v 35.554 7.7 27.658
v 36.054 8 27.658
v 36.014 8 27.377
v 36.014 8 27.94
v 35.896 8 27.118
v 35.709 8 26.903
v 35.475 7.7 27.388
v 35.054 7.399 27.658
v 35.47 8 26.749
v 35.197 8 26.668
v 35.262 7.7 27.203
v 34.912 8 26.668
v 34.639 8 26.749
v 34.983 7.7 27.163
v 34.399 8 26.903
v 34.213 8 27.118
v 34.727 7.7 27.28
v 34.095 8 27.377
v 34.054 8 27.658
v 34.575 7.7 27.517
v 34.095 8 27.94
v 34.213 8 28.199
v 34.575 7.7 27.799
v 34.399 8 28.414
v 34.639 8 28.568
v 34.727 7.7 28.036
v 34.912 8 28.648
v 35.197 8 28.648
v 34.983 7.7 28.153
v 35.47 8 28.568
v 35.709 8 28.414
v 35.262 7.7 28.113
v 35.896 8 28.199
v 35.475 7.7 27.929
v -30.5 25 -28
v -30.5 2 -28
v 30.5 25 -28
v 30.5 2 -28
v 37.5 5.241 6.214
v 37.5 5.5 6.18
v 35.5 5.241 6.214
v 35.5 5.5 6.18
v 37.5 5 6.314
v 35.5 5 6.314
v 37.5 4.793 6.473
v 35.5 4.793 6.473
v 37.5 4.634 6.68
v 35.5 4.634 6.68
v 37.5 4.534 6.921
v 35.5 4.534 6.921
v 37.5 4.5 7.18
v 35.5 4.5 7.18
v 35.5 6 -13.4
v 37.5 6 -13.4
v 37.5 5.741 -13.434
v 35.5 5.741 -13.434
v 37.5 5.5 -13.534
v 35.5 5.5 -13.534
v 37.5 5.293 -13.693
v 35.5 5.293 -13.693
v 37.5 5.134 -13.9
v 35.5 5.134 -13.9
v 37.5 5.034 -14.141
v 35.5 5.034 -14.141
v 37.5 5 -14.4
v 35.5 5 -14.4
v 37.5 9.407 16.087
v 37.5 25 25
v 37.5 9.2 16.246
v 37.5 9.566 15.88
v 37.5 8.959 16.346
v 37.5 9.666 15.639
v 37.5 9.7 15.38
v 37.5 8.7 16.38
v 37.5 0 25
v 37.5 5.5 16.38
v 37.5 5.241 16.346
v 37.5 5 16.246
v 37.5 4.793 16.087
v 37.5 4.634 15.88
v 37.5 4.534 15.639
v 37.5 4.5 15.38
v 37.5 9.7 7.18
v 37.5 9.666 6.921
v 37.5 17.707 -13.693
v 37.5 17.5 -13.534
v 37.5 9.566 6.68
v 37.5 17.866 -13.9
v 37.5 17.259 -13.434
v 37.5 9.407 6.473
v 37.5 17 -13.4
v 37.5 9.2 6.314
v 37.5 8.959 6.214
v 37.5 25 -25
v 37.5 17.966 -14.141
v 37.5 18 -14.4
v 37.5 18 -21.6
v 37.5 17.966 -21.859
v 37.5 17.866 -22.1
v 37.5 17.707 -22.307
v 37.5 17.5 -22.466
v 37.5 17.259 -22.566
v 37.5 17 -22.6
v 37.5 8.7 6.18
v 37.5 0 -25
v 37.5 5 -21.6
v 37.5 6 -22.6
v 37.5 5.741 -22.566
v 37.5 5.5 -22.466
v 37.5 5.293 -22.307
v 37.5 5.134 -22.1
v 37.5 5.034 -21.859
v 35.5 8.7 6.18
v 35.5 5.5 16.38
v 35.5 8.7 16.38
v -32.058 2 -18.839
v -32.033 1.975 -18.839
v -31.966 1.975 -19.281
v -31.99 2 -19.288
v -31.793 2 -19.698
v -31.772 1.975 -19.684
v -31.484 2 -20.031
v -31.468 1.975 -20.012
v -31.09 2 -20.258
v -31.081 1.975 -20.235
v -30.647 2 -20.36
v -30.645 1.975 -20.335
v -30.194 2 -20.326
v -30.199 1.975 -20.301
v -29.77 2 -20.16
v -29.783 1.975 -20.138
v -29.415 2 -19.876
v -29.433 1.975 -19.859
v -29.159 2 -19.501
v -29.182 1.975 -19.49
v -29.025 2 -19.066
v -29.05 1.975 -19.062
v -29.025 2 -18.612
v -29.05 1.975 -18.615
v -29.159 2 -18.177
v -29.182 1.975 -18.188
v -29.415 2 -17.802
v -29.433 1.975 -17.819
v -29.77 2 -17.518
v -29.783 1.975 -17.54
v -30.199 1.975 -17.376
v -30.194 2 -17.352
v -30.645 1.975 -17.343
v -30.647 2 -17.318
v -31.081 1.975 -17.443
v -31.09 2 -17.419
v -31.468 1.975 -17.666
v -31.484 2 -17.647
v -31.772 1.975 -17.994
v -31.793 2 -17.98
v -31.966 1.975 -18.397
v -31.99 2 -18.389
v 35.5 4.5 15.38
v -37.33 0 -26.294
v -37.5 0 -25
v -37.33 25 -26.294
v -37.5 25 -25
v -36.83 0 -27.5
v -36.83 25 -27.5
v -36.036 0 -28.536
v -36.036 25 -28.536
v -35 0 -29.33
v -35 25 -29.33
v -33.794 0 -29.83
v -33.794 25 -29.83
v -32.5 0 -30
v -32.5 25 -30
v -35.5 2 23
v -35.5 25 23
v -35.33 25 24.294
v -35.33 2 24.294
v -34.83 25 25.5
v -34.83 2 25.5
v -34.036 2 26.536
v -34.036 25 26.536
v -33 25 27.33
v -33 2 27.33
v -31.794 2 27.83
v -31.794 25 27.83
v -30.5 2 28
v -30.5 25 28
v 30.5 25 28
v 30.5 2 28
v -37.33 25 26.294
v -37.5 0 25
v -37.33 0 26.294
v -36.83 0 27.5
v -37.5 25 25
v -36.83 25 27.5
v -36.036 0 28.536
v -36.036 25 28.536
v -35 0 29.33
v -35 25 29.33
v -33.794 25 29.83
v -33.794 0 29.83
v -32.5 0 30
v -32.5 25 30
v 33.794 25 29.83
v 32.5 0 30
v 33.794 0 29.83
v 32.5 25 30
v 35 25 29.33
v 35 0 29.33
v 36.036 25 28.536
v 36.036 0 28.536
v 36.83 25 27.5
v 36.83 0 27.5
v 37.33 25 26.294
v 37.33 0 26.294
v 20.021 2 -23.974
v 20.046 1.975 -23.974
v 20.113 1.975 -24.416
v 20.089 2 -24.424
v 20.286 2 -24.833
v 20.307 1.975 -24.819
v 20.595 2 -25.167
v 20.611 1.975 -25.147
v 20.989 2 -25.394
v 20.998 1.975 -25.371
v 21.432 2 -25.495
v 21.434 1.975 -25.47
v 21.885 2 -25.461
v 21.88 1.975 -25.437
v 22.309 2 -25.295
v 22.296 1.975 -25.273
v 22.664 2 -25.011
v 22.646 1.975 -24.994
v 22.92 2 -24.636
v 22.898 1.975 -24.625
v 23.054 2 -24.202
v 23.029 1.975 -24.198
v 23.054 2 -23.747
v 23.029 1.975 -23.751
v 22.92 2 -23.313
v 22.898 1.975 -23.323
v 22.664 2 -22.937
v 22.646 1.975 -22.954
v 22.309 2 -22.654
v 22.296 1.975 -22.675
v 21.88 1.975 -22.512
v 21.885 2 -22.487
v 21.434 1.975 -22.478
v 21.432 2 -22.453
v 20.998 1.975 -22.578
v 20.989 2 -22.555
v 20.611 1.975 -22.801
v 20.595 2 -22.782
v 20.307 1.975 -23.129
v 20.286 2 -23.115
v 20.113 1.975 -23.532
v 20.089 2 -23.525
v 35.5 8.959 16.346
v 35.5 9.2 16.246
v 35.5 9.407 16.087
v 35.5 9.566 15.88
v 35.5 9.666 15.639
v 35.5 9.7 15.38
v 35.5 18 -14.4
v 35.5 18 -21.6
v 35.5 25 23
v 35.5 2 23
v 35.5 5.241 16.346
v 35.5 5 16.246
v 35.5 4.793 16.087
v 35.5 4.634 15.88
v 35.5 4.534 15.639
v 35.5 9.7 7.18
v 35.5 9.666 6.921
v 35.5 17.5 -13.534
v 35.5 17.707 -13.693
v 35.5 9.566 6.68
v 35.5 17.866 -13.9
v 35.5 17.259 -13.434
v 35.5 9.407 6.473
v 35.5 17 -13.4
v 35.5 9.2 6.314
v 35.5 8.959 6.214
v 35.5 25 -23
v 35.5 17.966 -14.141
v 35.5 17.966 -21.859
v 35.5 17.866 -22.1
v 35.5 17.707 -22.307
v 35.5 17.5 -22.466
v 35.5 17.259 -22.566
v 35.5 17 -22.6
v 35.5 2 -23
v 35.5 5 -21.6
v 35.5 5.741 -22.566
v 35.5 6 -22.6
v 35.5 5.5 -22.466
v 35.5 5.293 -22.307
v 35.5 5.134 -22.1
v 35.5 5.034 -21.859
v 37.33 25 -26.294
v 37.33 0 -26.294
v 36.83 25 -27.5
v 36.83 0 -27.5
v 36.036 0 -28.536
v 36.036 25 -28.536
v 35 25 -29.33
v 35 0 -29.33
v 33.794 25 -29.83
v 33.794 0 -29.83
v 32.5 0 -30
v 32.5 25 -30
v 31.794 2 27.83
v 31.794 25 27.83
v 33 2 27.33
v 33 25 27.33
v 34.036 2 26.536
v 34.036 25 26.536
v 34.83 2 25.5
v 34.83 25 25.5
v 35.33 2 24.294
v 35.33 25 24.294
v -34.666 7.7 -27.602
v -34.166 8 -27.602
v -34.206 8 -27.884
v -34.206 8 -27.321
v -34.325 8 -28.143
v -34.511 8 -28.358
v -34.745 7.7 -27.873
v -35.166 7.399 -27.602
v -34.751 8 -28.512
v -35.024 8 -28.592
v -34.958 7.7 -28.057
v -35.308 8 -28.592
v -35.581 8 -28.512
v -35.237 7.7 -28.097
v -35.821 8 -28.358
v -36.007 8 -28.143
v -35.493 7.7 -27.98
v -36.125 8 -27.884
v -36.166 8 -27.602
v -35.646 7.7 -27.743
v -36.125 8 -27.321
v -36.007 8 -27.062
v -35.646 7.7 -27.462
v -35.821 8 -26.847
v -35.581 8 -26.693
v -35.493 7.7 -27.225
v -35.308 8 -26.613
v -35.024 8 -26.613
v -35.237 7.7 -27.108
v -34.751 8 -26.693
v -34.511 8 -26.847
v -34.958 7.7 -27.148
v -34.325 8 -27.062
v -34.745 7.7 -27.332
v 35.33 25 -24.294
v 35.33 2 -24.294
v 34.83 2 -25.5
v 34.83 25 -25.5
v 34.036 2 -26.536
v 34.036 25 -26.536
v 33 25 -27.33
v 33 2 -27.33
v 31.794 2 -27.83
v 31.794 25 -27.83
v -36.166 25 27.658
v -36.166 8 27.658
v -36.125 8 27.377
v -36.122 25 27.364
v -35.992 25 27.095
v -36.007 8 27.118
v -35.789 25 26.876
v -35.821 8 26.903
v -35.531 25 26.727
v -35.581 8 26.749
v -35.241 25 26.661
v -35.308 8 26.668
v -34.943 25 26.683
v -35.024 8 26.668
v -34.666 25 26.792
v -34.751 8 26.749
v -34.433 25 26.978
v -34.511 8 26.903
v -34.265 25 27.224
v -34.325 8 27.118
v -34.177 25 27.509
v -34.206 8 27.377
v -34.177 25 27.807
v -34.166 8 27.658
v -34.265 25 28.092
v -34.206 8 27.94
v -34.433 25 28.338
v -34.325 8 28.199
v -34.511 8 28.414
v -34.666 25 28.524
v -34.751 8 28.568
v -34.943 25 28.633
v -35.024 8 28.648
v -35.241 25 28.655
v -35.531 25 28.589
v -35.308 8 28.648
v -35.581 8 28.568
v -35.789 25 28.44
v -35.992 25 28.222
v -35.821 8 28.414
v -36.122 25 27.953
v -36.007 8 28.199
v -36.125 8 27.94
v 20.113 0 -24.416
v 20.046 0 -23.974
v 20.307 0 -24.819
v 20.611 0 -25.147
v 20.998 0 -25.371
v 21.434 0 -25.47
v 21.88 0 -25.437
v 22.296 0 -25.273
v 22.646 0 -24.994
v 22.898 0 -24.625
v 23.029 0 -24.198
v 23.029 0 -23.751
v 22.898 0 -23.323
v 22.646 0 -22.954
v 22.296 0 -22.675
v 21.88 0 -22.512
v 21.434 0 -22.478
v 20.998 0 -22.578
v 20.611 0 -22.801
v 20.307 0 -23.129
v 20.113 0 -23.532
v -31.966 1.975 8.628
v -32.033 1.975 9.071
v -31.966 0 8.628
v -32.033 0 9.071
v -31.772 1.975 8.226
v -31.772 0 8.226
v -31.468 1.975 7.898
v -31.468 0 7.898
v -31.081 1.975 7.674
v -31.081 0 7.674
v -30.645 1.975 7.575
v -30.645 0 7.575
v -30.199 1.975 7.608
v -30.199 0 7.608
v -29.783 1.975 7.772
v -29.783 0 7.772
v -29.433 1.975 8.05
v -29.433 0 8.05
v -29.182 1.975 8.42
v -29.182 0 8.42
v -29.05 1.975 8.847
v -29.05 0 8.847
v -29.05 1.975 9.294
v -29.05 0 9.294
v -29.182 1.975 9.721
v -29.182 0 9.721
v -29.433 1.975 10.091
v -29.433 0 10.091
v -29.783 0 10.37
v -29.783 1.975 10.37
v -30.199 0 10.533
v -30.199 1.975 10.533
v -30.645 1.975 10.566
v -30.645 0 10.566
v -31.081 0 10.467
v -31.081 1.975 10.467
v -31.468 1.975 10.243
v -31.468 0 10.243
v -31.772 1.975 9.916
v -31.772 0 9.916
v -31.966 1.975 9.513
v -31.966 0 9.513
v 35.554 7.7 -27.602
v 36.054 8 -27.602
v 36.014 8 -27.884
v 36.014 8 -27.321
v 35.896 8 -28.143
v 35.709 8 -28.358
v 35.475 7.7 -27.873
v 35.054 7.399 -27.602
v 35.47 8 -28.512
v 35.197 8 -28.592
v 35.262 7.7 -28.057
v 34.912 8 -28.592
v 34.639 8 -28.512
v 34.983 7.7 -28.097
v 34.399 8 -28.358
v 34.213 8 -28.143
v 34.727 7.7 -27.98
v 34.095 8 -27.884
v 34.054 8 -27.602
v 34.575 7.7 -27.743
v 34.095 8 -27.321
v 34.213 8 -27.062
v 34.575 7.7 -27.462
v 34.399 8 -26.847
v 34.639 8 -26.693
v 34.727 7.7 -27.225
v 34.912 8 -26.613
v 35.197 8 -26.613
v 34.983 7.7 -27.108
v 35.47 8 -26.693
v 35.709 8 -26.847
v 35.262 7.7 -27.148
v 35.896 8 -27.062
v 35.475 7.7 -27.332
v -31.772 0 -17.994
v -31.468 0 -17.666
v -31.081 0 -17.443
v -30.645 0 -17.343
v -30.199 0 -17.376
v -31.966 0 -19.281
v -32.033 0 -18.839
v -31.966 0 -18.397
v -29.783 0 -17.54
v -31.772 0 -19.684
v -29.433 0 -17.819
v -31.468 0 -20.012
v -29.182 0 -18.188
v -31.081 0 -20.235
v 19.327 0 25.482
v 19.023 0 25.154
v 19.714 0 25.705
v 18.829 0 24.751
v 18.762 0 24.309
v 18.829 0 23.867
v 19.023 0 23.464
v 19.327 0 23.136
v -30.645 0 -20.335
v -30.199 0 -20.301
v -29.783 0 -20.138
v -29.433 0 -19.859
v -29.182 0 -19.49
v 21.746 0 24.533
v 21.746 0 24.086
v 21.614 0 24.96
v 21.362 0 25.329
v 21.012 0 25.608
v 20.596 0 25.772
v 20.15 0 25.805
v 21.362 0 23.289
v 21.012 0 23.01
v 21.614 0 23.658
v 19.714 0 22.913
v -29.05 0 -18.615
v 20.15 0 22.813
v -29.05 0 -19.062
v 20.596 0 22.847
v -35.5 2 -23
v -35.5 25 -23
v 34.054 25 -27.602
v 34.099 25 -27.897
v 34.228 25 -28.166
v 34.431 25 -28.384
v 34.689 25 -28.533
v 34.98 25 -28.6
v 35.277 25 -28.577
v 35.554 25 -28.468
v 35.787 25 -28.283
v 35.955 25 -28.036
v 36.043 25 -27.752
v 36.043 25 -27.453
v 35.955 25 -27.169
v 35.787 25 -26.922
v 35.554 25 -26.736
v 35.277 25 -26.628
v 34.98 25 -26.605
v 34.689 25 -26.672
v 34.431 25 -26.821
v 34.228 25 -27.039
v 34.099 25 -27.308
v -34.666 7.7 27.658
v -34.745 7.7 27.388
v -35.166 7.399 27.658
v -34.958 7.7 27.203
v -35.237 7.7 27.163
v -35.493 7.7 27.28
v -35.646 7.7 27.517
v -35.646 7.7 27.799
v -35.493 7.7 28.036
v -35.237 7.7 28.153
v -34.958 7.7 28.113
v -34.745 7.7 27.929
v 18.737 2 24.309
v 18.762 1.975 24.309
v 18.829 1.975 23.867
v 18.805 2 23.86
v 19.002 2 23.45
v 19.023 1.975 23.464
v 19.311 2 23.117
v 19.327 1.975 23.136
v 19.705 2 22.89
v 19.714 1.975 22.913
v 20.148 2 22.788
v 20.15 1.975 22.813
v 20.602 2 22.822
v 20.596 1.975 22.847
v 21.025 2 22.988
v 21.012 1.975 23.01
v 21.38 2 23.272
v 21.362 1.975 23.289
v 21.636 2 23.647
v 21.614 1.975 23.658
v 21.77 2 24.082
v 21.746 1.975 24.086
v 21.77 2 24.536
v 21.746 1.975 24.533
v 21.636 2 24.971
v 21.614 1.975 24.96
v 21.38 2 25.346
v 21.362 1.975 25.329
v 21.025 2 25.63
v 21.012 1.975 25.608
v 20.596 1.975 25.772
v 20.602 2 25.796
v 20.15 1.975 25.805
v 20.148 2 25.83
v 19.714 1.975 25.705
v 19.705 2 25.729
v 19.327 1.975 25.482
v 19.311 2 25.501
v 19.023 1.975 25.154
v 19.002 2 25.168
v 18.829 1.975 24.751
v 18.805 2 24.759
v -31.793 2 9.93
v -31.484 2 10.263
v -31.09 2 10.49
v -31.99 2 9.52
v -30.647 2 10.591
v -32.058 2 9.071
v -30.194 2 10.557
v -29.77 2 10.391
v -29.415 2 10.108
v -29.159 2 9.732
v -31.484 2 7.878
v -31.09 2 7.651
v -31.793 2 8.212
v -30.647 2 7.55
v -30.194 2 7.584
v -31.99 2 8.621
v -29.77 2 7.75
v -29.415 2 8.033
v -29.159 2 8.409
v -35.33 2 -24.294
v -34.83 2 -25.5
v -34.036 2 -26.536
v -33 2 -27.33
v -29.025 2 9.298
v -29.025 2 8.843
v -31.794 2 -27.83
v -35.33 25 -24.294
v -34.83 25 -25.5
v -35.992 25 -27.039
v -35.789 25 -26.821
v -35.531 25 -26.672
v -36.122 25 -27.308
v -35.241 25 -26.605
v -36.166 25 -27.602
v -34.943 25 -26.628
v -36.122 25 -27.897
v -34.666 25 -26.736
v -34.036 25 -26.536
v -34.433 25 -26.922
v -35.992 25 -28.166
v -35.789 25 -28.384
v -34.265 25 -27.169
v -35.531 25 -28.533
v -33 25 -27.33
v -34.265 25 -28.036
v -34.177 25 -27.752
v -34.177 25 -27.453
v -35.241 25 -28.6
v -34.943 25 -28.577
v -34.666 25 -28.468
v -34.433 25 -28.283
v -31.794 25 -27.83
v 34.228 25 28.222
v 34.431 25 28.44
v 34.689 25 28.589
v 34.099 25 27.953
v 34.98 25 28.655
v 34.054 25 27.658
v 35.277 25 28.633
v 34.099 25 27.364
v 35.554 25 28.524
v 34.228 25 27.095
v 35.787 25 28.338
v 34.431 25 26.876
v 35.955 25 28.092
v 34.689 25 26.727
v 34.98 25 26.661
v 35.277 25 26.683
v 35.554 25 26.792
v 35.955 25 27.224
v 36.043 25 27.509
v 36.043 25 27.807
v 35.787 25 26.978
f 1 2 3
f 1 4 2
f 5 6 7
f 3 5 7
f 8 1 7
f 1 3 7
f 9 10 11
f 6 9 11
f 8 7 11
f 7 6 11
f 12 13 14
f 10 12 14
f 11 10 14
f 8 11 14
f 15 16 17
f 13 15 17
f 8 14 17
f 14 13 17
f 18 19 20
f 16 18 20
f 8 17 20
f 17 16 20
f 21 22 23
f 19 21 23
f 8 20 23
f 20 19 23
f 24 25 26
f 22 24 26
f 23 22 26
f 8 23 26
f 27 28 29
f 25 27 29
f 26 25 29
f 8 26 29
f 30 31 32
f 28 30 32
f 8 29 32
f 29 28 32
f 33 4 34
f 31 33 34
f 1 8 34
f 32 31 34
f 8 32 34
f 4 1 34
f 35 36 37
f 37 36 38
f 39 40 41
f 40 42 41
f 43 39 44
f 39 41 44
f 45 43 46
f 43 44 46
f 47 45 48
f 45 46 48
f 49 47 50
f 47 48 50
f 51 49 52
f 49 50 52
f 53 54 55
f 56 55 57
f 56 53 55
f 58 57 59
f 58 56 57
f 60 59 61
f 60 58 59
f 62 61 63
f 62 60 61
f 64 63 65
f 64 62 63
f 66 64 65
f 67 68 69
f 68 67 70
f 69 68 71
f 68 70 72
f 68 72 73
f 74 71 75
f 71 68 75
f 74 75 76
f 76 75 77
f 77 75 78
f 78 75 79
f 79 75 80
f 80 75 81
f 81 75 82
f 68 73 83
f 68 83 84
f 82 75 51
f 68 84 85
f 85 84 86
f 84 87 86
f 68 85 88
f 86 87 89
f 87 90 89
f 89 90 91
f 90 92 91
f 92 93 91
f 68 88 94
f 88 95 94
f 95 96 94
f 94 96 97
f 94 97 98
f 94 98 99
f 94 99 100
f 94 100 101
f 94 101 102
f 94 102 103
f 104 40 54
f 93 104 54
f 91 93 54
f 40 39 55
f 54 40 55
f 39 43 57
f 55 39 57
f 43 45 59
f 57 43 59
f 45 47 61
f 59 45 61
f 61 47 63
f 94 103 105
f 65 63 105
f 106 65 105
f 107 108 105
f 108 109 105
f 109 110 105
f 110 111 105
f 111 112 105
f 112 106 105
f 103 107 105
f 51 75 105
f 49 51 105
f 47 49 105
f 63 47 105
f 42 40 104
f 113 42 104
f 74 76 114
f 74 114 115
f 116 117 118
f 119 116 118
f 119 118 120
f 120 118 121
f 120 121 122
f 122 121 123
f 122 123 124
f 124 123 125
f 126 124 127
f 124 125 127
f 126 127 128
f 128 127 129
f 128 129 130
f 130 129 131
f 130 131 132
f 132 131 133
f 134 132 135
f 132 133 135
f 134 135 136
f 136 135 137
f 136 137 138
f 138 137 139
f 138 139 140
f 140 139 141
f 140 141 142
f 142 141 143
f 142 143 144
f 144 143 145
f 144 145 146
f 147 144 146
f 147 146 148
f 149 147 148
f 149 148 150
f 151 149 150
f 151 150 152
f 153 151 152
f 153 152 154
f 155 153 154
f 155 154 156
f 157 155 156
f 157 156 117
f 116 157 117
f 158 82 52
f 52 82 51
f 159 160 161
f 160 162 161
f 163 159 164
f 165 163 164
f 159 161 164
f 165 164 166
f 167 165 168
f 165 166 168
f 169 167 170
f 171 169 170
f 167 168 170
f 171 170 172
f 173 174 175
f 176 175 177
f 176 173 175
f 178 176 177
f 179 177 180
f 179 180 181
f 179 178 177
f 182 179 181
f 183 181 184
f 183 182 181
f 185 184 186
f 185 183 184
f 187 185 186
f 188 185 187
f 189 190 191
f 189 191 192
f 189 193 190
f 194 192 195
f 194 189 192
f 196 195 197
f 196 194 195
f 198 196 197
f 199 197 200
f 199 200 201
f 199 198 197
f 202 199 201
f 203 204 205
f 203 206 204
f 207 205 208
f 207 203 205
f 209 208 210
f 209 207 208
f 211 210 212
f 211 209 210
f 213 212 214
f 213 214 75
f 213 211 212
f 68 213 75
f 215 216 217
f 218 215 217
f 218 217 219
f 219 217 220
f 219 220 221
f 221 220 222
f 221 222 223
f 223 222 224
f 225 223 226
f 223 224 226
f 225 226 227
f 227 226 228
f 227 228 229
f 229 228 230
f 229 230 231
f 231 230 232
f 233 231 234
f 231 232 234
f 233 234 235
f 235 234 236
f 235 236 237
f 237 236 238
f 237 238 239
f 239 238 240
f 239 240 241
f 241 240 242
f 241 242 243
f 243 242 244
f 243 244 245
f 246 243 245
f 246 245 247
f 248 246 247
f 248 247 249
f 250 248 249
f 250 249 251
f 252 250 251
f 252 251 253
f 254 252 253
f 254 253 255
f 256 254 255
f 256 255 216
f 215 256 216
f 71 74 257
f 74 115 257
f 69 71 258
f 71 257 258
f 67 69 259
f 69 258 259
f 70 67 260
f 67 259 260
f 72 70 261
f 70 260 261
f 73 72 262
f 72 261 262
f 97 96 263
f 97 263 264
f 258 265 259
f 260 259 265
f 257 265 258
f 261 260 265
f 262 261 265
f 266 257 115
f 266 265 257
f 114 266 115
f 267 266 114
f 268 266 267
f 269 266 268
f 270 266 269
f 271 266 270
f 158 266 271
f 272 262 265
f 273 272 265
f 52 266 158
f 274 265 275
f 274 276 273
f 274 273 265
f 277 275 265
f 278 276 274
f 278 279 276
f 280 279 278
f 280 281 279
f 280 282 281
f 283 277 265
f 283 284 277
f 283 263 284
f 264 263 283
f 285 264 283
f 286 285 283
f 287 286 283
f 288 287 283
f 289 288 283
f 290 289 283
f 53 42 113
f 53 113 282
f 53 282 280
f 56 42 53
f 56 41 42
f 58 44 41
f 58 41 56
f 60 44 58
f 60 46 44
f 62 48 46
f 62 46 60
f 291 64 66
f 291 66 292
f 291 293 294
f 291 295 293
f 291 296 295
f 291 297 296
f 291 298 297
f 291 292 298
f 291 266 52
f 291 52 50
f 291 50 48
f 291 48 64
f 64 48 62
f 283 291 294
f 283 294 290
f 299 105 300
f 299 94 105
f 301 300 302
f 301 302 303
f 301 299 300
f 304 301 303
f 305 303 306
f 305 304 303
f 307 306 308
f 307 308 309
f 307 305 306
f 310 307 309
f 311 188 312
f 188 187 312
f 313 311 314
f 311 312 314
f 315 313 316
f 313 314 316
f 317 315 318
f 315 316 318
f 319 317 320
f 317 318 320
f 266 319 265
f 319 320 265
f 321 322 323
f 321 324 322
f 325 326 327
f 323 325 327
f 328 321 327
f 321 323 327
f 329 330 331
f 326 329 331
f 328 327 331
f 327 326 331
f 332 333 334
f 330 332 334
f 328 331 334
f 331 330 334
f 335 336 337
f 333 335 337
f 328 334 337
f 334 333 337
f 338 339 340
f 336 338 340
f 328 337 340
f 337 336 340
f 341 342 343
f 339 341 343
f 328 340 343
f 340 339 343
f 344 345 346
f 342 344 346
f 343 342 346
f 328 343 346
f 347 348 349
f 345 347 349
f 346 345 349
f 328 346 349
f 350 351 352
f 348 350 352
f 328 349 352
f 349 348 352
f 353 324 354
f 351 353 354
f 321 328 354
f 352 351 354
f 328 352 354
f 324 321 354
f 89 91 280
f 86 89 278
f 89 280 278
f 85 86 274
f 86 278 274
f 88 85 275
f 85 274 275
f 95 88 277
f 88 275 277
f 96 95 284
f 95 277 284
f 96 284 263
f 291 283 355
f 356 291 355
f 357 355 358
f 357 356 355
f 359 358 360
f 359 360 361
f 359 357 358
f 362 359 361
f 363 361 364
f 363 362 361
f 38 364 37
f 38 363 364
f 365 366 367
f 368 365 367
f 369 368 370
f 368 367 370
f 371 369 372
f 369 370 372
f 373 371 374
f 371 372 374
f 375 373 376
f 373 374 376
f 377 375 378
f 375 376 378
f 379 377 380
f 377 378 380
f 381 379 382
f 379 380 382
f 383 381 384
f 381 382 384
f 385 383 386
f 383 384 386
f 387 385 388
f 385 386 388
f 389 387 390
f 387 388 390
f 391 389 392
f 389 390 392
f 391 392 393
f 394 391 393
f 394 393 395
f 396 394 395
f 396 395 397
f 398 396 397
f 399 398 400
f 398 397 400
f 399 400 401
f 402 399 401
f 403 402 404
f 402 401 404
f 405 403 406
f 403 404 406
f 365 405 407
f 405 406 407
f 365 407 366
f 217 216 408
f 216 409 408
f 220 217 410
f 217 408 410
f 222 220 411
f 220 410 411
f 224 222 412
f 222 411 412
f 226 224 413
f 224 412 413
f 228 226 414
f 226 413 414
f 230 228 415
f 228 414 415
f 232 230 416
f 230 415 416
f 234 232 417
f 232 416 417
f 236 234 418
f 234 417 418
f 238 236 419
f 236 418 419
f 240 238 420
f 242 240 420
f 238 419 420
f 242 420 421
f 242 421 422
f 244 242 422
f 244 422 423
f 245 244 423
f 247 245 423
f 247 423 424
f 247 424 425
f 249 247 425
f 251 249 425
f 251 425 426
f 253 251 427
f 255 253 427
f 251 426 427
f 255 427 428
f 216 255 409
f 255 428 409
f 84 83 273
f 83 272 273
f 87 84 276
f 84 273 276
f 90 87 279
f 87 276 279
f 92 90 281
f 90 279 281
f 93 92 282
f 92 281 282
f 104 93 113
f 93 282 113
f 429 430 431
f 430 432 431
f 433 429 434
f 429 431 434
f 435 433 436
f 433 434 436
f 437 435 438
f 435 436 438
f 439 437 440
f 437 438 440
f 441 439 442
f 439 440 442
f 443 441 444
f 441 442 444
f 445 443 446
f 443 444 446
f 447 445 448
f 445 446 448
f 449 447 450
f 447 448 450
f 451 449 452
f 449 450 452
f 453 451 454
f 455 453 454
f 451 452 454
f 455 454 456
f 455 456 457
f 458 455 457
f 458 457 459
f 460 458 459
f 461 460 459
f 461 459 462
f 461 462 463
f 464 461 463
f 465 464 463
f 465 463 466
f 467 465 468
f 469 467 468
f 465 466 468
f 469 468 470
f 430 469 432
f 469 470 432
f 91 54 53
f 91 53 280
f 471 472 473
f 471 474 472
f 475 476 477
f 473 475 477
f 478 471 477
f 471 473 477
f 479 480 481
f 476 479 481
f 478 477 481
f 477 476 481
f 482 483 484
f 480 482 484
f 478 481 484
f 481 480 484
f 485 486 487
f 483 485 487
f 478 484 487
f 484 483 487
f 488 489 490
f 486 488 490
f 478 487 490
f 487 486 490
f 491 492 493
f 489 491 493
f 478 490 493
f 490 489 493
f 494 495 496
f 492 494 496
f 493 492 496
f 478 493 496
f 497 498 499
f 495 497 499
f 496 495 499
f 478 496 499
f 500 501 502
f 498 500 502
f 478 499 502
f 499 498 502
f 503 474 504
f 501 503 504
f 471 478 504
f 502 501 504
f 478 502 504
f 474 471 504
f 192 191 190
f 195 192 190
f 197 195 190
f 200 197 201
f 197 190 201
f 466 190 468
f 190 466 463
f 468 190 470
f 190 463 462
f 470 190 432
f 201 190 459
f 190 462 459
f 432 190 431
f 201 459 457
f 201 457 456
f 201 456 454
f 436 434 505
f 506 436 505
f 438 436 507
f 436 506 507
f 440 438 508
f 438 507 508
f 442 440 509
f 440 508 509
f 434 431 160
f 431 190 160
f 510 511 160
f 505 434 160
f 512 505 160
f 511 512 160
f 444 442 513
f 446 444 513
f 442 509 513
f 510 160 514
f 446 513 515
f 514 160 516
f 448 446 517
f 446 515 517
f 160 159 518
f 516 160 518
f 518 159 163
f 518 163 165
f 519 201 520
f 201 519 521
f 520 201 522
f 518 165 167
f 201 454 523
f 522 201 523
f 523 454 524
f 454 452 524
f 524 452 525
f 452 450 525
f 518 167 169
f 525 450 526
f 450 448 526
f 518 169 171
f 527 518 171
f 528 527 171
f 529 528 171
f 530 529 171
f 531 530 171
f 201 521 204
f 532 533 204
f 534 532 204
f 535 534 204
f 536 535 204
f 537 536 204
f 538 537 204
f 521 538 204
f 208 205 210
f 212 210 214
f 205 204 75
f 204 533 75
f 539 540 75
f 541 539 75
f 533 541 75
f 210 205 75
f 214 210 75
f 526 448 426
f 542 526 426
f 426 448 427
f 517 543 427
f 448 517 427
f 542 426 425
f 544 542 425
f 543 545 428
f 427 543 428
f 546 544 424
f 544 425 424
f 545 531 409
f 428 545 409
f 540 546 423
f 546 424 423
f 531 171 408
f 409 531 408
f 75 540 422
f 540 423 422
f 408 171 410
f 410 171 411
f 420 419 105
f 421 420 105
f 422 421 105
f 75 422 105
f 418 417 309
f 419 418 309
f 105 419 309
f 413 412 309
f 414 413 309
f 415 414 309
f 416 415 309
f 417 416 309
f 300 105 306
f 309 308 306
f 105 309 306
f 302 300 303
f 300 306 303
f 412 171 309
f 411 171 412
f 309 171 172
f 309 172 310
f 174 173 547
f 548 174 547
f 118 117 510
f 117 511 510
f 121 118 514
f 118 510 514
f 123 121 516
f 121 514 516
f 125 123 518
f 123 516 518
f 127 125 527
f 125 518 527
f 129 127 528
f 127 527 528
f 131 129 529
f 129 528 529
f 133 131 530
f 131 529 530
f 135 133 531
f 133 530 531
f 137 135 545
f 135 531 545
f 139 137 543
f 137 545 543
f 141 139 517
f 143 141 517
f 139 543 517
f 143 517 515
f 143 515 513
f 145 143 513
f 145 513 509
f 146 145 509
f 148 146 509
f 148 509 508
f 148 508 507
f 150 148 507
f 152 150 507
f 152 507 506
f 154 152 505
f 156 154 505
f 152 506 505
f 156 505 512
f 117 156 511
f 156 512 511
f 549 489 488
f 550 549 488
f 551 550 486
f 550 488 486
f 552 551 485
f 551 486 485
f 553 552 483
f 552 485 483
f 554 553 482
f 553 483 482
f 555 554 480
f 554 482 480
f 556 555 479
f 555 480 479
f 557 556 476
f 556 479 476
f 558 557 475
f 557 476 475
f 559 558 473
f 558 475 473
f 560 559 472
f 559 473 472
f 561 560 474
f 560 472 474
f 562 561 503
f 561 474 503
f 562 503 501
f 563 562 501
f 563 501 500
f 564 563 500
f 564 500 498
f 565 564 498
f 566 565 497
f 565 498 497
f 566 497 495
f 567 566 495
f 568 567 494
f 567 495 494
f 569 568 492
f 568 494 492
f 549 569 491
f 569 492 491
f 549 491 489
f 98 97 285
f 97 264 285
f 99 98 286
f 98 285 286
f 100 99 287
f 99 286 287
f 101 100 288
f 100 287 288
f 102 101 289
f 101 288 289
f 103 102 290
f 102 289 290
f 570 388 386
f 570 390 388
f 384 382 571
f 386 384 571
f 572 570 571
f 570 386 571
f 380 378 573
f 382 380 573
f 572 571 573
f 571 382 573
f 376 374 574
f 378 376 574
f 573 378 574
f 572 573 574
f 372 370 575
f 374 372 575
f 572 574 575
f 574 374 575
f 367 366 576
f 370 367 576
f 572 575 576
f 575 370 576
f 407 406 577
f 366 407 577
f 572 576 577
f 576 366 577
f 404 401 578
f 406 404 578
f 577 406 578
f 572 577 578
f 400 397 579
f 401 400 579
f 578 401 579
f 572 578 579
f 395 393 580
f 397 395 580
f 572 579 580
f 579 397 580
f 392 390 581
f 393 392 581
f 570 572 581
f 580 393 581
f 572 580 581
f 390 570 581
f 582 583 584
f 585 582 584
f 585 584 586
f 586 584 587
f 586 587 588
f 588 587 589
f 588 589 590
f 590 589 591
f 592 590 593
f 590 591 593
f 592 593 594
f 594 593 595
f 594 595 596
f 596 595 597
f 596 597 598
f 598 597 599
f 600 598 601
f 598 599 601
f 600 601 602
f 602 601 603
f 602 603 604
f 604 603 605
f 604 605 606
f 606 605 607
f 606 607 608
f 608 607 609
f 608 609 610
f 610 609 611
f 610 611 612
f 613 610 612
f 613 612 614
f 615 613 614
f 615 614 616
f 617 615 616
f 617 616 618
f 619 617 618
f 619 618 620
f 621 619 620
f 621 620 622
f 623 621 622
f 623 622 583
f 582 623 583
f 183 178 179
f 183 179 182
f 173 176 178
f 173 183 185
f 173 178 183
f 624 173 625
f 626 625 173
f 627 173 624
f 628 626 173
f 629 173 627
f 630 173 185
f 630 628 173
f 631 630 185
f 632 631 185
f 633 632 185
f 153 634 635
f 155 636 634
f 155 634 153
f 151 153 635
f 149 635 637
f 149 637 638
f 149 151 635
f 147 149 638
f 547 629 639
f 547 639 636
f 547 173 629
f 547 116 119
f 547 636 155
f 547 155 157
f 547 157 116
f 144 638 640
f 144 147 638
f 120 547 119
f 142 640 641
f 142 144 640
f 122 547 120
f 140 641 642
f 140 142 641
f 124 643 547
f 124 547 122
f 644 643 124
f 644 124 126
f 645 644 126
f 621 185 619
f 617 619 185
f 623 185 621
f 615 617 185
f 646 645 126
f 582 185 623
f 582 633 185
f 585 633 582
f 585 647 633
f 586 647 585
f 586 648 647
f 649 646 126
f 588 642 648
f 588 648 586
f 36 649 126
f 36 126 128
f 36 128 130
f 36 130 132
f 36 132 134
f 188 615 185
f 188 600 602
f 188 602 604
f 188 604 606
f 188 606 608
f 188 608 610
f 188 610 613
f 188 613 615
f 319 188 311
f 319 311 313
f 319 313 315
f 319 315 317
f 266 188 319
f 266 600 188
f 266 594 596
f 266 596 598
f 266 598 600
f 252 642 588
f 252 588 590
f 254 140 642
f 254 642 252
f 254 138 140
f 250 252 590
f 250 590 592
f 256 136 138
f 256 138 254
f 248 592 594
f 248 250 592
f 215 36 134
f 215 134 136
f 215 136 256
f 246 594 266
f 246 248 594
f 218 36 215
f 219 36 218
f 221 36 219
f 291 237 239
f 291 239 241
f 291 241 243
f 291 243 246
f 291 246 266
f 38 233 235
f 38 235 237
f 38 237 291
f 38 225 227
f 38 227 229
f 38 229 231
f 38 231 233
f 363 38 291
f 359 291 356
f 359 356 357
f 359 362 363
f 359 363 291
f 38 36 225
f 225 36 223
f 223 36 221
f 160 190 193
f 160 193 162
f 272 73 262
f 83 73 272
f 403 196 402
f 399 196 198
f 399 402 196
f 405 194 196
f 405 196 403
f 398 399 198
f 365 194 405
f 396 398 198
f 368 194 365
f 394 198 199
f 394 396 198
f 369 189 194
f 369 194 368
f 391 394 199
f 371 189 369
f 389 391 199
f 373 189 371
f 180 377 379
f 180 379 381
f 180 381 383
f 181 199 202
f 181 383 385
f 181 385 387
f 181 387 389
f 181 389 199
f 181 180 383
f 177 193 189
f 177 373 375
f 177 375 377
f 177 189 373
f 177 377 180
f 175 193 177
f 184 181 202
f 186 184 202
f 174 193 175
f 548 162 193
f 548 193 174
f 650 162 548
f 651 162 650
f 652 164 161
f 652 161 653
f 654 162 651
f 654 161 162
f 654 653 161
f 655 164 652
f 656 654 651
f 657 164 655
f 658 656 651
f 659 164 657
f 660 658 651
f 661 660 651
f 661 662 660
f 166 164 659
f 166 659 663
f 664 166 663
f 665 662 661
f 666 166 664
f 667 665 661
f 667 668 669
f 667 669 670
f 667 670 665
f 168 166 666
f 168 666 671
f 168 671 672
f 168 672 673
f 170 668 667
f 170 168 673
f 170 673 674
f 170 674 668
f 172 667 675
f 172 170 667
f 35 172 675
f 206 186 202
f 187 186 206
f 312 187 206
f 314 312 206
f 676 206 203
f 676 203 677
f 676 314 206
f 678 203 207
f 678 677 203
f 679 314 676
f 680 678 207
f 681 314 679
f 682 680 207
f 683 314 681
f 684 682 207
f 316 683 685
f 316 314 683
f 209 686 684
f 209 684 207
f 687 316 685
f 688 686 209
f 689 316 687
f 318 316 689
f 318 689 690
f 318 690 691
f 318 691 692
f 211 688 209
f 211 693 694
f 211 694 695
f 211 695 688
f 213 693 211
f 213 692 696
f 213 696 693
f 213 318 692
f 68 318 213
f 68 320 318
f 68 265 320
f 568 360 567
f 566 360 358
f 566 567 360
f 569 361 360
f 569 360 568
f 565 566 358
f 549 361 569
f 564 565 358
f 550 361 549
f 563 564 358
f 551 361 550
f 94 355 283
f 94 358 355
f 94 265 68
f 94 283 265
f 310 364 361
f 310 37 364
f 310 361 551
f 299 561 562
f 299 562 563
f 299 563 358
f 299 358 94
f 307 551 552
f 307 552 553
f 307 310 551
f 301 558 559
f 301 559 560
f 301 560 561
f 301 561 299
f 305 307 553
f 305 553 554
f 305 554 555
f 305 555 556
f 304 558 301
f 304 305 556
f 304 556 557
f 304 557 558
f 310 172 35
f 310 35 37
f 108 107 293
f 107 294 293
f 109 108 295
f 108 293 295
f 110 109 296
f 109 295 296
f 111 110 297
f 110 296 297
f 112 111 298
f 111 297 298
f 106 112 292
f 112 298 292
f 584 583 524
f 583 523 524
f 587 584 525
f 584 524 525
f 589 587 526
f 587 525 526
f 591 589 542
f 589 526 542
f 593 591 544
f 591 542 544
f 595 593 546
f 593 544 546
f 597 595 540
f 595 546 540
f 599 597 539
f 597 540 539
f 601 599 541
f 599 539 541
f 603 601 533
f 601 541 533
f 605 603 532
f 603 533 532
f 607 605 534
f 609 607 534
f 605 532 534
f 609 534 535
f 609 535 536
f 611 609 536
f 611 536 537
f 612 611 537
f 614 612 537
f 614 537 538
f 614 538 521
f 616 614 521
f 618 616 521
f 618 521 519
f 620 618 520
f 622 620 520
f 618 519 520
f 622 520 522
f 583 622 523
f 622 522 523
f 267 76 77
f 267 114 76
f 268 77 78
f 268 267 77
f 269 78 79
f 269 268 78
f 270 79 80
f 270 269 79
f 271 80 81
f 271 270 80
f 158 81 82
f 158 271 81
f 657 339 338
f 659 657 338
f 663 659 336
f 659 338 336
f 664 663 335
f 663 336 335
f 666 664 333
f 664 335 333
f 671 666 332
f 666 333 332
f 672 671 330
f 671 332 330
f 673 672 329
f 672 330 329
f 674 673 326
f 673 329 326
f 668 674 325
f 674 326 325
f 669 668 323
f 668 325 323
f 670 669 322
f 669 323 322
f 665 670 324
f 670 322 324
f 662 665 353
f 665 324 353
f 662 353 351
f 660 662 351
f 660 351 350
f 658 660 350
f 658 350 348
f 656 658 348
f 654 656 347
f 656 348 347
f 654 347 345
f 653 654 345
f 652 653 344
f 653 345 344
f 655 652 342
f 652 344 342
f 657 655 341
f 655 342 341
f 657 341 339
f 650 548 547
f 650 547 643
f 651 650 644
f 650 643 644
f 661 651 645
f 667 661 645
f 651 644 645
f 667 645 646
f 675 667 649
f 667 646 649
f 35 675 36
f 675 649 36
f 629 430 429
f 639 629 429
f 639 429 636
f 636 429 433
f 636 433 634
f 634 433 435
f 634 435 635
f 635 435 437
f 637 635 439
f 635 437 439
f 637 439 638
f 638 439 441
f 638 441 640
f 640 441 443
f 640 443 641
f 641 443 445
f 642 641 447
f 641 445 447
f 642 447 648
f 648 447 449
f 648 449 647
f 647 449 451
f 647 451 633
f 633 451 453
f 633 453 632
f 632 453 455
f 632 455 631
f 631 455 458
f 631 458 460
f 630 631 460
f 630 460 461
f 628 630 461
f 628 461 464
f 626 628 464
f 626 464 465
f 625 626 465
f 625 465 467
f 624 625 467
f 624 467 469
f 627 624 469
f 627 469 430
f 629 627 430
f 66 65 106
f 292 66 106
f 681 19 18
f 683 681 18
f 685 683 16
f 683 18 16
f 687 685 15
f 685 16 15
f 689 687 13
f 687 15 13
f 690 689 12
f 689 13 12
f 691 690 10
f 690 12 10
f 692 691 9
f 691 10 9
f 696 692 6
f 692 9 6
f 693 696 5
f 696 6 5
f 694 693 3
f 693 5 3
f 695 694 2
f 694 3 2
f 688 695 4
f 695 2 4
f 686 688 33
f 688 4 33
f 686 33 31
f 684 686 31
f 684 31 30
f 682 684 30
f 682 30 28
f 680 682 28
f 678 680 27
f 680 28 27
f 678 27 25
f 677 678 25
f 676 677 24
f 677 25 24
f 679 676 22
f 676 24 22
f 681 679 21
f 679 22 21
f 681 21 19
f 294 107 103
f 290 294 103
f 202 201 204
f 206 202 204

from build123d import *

# Parameters (mm, degrees)
SKIZZE1_W                                = 75
SKIZZE1_H                                = 60
AUFSATZ_LINEAR_AUSTRAGEN1_DEPTH          = 25
WANDUNG1_T                               = -2
VERRUNDUNG1_R                            = 5
SKIZZE2_W                                = 9.2
SKIZZE2_H                                = 13
SCHNITT_LINEAR_AUSTRAGEN1_DEPTH          = 25
VERRUNDUNG2_R                            = 1
SKIZZE3_W                                = 10.2
SKIZZE3_H                                = 5.2
SCHNITT_LINEAR_AUSTRAGEN2_DEPTH          = 25
VERRUNDUNG3_R                            = 1
F_3_0_3_DURCHMESSER_BOHRUNG1_D           = 3
F_3_0_3_DURCHMESSER_BOHRUNG1_CSINK_D     = 3.05
F_3_0_3_DURCHMESSER_BOHRUNG1_CSINK_ANGLE = 90
F_2_0_2_DURCHMESSER_BOHRUNG1_D           = 2
F_2_0_2_DURCHMESSER_BOHRUNG1_DEPTH       = 20
F_2_0_2_DURCHMESSER_BOHRUNG1_CSINK_D     = 2.05
F_2_0_2_DURCHMESSER_BOHRUNG1_CSINK_ANGLE = 90
F_2_0_2_DURCHMESSER_BOHRUNG1_TIP         = 0.600860619


with BuildPart() as part:
    # Skizze1 → Aufsatz-Linear austragen1 (new body)
    with BuildSketch(Plane(origin=(0, 0, 0), x_dir=(1, 0, 0), z_dir=(0, 1, 0))):
        Rectangle(SKIZZE1_W, SKIZZE1_H)
    extrude(amount=AUFSATZ_LINEAR_AUSTRAGEN1_DEPTH)

    # Wandung1
    wandung1_openings = [part.faces().sort_by_distance(p)[0] for p in [
        (0, 25, 0),
    ]]
    offset(amount=WANDUNG1_T, openings=wandung1_openings, kind=Kind.INTERSECTION)

    # Verrundung1
    verrundung1_edges = [part.edges().sort_by_distance(p)[0] for p in [
        (35.5, 13.5, 28),
        (35.5, 13.5, -28),
        (-35.5, 13.5, -28),
        (-35.5, 13.5, 28),
        (37.5, 12.5, 30),
        (-37.5, 12.5, 30),
        (-37.5, 12.5, -30),
        (37.5, 12.5, -30),
    ]]
    fillet(verrundung1_edges, radius=VERRUNDUNG1_R)

    # Skizze2 → Schnitt-Linear austragen1 (cut)
    with BuildSketch(Plane(origin=(37.5, 0, 0), x_dir=(0, 0, -1), z_dir=(1, 0, 0))):
        with Locations((18, 11.5)):
            Rectangle(SKIZZE2_W, SKIZZE2_H)
    extrude(amount=-SCHNITT_LINEAR_AUSTRAGEN1_DEPTH, mode=Mode.SUBTRACT)

    # Verrundung2
    verrundung2_edges = [part.edges().sort_by_distance(p)[0] for p in [
        (36.5, 5, -13.4),
        (36.5, 18, -13.4),
        (36.5, 18, -22.6),
        (36.5, 5, -22.6),
    ]]
    fillet(verrundung2_edges, radius=VERRUNDUNG2_R)

    # Skizze3 → Schnitt-Linear austragen2 (cut)
    with BuildSketch(Plane(origin=(37.5, 0, 0), x_dir=(0, 0, -1), z_dir=(1, 0, 0))):
        with Locations((-11.28, 7.1)):
            Rectangle(SKIZZE3_W, SKIZZE3_H)
    extrude(amount=-SCHNITT_LINEAR_AUSTRAGEN2_DEPTH, mode=Mode.SUBTRACT)

    # Verrundung3
    verrundung3_edges = [part.edges().sort_by_distance(p)[0] for p in [
        (36.5, 4.5, 16.38),
        (36.5, 9.7, 16.38),
        (36.5, 9.7, 6.18),
        (36.5, 4.5, 6.18),
    ]]
    fillet(verrundung3_edges, radius=VERRUNDUNG3_R)

    # Ø3.0 (3) Durchmesser Bohrung1 (through all)
    with Locations(Plane(origin=(0, 2, 0), x_dir=(1, 0, 0), z_dir=(0, 1, 0))):
        with Locations((21.546108128, 23.974231713), (-30.532956337, 18.838889879), (-30.532956337, -9.070576608), (20.26227267, -24.309145311)):
            CounterSinkHole(F_3_0_3_DURCHMESSER_BOHRUNG1_D / 2, F_3_0_3_DURCHMESSER_BOHRUNG1_CSINK_D / 2, counter_sink_angle=F_3_0_3_DURCHMESSER_BOHRUNG1_CSINK_ANGLE)

    # Ø2.0 (2) Durchmesser Bohrung1
    with Locations(Plane(origin=(0, 28, 0), x_dir=(1, 0, 0), z_dir=(0, 1, 0))):
        with Locations((-35.165927774, 27.602462356), (35.054289908, 27.602462356), (35.054289908, -27.658281289), (-35.165927774, -27.658281289)):
            CounterSinkHole(F_2_0_2_DURCHMESSER_BOHRUNG1_D / 2, F_2_0_2_DURCHMESSER_BOHRUNG1_CSINK_D / 2, depth=F_2_0_2_DURCHMESSER_BOHRUNG1_DEPTH, counter_sink_angle=F_2_0_2_DURCHMESSER_BOHRUNG1_CSINK_ANGLE)
            with Locations((0, 0, -(F_2_0_2_DURCHMESSER_BOHRUNG1_DEPTH + F_2_0_2_DURCHMESSER_BOHRUNG1_TIP / 2))):  # 118° drill point
                Cone(0, F_2_0_2_DURCHMESSER_BOHRUNG1_D / 2, F_2_0_2_DURCHMESSER_BOHRUNG1_TIP, mode=Mode.SUBTRACT)


solid = part.part
